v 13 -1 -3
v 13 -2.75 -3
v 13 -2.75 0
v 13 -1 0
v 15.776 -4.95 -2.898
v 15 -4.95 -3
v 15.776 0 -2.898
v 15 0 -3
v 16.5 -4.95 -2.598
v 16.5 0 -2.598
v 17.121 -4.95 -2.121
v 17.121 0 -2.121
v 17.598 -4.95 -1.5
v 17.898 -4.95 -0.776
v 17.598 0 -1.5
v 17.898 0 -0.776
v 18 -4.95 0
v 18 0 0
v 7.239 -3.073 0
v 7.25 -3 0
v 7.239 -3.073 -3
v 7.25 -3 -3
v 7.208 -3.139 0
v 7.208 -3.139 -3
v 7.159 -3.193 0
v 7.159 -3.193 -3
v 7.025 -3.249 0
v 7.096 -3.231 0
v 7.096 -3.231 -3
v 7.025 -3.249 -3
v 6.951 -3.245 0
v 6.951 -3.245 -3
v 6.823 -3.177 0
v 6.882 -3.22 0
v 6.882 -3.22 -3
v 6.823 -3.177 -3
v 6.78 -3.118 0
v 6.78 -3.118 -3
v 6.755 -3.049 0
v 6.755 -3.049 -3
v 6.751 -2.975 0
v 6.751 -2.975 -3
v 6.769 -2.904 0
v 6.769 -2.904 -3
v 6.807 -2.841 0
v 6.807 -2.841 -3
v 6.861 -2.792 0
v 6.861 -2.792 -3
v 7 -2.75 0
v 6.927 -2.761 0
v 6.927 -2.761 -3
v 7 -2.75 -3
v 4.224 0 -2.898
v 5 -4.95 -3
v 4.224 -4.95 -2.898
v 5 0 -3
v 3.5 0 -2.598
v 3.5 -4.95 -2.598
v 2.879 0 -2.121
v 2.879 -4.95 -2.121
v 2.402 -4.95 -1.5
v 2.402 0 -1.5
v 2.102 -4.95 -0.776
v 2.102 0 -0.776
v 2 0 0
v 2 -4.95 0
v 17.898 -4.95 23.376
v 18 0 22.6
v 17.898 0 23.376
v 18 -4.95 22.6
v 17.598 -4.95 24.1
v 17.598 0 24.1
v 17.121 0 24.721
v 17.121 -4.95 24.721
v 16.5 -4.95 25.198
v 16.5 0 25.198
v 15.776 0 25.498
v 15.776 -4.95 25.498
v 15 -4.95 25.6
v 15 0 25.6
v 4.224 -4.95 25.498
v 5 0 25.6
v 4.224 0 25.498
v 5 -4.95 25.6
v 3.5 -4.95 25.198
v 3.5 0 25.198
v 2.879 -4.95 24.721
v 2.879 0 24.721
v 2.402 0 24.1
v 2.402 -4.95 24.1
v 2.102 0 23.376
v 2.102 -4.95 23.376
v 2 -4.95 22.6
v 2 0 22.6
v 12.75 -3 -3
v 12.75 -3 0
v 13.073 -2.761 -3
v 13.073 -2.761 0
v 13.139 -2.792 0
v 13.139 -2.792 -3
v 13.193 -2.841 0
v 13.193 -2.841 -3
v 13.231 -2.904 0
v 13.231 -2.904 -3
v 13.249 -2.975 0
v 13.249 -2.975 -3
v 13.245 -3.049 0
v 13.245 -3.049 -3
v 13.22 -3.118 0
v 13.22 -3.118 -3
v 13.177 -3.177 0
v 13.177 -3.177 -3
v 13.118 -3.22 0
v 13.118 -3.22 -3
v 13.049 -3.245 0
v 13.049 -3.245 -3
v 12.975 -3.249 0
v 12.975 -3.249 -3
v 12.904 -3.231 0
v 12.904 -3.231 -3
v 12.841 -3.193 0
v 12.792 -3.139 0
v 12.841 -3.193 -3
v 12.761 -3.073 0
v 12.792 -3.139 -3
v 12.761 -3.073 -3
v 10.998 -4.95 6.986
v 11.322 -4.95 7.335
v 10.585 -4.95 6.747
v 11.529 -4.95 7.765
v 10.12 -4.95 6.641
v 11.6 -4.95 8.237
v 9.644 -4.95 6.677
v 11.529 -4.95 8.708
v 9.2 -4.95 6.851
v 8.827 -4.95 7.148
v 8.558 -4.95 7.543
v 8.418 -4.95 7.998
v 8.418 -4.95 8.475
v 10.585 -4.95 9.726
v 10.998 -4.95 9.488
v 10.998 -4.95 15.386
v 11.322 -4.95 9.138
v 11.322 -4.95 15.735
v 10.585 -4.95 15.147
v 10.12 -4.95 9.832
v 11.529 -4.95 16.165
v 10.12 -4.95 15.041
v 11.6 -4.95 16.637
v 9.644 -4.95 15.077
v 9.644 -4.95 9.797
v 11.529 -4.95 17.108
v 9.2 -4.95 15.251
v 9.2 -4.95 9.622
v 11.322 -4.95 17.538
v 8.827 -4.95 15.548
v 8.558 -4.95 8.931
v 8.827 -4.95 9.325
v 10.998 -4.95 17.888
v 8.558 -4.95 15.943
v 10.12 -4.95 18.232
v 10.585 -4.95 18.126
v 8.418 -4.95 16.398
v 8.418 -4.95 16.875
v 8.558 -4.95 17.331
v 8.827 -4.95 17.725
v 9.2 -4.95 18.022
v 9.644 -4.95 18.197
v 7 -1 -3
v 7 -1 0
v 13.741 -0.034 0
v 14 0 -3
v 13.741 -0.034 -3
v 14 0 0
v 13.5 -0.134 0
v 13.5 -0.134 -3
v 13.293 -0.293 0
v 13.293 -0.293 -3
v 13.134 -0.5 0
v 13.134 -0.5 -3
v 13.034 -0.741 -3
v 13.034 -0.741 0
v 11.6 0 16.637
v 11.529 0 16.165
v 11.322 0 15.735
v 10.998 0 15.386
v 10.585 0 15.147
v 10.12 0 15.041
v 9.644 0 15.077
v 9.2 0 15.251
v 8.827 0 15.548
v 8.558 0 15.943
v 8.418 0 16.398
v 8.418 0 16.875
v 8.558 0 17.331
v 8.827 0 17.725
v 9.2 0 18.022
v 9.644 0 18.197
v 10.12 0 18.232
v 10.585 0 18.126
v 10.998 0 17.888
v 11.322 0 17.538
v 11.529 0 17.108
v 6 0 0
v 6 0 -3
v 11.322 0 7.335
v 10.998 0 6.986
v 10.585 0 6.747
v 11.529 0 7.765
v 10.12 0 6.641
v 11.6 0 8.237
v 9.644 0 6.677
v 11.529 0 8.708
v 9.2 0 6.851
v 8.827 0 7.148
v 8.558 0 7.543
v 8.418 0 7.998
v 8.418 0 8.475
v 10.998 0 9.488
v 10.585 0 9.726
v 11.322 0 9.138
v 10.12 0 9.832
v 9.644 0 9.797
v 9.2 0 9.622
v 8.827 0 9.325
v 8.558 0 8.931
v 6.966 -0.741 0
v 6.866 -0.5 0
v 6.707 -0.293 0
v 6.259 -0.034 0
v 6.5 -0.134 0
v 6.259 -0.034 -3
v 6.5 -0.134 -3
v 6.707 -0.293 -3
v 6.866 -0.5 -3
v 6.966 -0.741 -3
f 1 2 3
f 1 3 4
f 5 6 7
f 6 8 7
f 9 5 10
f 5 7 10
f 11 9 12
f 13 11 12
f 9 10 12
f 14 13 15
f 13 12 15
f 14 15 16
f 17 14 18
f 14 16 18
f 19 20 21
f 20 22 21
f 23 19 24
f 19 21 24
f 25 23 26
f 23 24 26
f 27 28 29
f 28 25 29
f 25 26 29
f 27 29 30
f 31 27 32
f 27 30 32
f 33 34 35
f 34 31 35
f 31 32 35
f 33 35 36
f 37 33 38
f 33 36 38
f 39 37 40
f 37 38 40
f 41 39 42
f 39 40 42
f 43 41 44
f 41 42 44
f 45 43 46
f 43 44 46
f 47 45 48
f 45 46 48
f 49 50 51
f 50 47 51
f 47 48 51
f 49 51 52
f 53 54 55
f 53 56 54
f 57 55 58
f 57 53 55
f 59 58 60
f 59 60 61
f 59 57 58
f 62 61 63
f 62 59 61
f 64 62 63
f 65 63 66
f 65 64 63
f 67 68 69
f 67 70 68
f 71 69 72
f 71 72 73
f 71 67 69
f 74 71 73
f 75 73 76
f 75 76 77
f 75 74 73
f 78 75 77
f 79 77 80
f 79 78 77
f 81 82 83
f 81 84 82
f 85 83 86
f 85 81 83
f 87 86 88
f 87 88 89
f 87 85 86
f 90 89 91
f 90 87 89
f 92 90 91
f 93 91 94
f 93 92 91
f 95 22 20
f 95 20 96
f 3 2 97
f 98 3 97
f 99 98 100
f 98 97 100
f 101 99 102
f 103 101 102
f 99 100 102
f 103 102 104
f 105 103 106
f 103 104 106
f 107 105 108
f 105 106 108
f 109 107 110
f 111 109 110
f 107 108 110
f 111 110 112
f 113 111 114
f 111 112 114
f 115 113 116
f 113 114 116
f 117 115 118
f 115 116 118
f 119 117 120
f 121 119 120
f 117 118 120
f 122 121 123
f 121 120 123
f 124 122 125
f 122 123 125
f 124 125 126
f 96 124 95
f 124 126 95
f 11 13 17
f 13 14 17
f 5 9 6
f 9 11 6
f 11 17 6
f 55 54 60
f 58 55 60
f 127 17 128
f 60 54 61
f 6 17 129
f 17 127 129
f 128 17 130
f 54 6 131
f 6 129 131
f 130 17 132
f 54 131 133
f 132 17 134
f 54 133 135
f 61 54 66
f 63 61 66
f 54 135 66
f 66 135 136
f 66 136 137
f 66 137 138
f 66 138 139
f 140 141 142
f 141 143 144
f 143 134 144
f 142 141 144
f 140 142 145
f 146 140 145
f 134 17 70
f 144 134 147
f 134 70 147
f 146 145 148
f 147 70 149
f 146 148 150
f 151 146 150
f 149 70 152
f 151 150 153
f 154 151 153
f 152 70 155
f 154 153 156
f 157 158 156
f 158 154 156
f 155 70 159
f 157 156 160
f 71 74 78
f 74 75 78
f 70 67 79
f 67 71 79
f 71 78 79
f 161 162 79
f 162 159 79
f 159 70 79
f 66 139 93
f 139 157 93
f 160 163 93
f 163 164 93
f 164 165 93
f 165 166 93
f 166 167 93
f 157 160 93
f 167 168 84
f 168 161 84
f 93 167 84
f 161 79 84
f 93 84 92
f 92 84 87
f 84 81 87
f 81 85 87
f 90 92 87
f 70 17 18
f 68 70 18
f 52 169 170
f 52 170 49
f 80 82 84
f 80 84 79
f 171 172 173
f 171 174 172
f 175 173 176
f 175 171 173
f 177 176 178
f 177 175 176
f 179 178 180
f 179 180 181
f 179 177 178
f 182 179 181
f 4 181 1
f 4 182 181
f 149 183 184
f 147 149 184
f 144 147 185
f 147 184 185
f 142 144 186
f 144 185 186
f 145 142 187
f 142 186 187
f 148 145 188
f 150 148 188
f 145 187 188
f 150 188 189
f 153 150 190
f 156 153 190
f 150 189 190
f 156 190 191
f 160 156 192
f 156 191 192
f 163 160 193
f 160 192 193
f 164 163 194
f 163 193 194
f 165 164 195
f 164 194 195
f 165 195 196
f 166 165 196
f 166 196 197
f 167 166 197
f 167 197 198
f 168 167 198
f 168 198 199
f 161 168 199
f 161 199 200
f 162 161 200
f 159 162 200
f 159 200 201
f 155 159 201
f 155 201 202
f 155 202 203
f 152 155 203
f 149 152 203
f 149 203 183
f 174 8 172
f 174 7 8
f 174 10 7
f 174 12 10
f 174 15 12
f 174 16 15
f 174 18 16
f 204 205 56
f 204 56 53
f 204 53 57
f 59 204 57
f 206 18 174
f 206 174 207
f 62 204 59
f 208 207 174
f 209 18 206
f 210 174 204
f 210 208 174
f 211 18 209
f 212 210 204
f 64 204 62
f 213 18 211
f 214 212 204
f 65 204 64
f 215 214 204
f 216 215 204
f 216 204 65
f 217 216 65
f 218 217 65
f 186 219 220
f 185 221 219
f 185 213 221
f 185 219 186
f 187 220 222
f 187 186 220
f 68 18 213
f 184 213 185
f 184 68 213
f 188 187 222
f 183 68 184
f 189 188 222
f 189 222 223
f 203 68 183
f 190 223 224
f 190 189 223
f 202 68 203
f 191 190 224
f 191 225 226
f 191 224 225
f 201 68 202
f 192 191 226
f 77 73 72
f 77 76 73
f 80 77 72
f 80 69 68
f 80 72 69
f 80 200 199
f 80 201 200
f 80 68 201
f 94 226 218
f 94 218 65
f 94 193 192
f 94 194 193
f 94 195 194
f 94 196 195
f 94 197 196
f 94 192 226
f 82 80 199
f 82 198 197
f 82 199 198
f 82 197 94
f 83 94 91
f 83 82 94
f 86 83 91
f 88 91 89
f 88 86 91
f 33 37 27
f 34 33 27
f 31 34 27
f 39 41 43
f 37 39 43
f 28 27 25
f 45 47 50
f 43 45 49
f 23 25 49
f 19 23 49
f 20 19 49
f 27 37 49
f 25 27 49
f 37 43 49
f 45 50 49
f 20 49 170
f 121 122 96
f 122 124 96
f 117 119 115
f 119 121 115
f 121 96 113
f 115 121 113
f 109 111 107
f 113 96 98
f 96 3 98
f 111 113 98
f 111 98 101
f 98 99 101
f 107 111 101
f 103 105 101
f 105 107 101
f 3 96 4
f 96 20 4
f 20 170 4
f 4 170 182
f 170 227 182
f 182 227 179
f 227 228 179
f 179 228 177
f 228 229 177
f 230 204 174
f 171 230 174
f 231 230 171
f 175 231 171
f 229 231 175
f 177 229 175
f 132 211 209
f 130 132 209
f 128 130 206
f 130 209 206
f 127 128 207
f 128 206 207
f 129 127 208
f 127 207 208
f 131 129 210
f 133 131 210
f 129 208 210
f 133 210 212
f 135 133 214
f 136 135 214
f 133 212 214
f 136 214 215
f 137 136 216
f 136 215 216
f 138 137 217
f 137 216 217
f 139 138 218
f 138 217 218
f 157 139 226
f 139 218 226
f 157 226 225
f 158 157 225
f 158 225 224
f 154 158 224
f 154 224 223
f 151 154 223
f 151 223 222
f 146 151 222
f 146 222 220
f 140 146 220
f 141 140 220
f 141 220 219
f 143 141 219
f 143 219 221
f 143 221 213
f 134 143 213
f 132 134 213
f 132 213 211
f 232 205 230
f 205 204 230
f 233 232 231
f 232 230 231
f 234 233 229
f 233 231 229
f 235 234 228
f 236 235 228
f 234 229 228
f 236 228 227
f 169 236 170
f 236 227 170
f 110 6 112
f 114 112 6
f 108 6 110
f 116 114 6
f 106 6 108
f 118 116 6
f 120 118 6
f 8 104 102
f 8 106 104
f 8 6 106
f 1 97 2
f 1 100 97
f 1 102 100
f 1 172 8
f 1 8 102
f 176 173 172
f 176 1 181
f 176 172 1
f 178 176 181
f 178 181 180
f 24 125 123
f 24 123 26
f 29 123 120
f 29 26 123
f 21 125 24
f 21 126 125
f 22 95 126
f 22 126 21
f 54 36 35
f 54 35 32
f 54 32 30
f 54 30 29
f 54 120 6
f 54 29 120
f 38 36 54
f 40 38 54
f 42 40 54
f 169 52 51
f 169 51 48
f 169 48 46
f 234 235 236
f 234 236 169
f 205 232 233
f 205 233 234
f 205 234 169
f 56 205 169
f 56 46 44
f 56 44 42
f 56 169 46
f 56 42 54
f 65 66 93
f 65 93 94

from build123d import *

# Parameters (mm, degrees)
SKETCH_2_W          = 20
SKETCH_2_H          = 4.95
EXTRUDE_1_DEPTH     = 25.6
SKETCH_3_R          = 1.6
CUT_EXTRUDE_1_DEPTH = 5.95
SKETCH_4_W          = 20
SKETCH_4_H          = 4.95
EXTRUDE_2_DEPTH     = 3
CUT_EXTRUDE_2_DEPTH = 3
SKETCH_6_R          = 0.25
CUT_EXTRUDE_3_DEPTH = 3
FILLET_2_R          = 1
SKETCH_7_W          = 2
SKETCH_7_H          = 4.95
CUT_EXTRUDE_4_DEPTH = 29.6
FILLET_3_R          = 3


with BuildPart() as part:
    # 草图2 → 凸台-拉伸1 (new body)
    with BuildSketch(Plane.XY):
        with Locations((10, -2.475)):
            Rectangle(SKETCH_2_W, SKETCH_2_H)
    extrude(amount=EXTRUDE_1_DEPTH)

    # 草图3 → 切除-拉伸1 (cut, through all)
    with BuildSketch(Plane(origin=(0, 0, 0), x_dir=(1, 0, 0), z_dir=(0, 1, 0))):
        with Locations((10, -8.236740591)):
            Circle(SKETCH_3_R)
        with Locations((10, -16.636740591)):
            Circle(SKETCH_3_R)
    extrude(amount=-CUT_EXTRUDE_1_DEPTH, mode=Mode.SUBTRACT)

    # 草图4 → 凸台-拉伸2 (add)
    with BuildSketch(Plane(origin=(0, 0, 0), x_dir=(-1, 0, 0), z_dir=(0, 0, -1))):
        with Locations((-10, -2.475)):
            Rectangle(SKETCH_4_W, SKETCH_4_H)
    extrude(amount=EXTRUDE_2_DEPTH)

    # 草图5 → 切除-拉伸2 (cut)
    with BuildSketch(Plane(origin=(0, 0, -3), x_dir=(-1, 0, 0), z_dir=(0, 0, -1))):
        Polygon((-10, 0), (-7, 0), (-7, -3), (-13, -3), (-13, 0), align=None)
    extrude(amount=-CUT_EXTRUDE_2_DEPTH, mode=Mode.SUBTRACT)

    # 草图6 → 切除-拉伸3 (cut)
    with BuildSketch(Plane(origin=(0, 0, -3), x_dir=(-1, 0, 0), z_dir=(0, 0, -1))):
        with Locations((-7, -3)):
            Circle(SKETCH_6_R)
        with Locations((-13, -3)):
            Circle(SKETCH_6_R)
    extrude(amount=-CUT_EXTRUDE_3_DEPTH, mode=Mode.SUBTRACT)

    # 圆角2
    fillet_2_edges = [part.edges().sort_by_distance(p)[0] for p in [
        (13, 0, -1.5),
        (7, 0, -1.5),
    ]]
    fillet(fillet_2_edges, radius=FILLET_2_R)

    # 草图7 → 切除-拉伸4 (cut, through all)
    with BuildSketch(Plane(origin=(0, 0, -3), x_dir=(-1, 0, 0), z_dir=(0, 0, -1))):
        with Locations((-1, -2.475)):
            Rectangle(SKETCH_7_W, SKETCH_7_H)
        with Locations((-19, -2.475)):
            Rectangle(SKETCH_7_W, SKETCH_7_H)
    extrude(amount=-CUT_EXTRUDE_4_DEPTH, mode=Mode.SUBTRACT)

    # 圆角3
    fillet_3_edges = [part.edges().sort_by_distance(p)[0] for p in [
        (2, -2.475, 25.6),
        (2, -2.475, -3),
        (18, -2.475, 25.6),
        (18, -2.475, -3),
    ]]
    fillet(fillet_3_edges, radius=FILLET_3_R)


solid = part.part
